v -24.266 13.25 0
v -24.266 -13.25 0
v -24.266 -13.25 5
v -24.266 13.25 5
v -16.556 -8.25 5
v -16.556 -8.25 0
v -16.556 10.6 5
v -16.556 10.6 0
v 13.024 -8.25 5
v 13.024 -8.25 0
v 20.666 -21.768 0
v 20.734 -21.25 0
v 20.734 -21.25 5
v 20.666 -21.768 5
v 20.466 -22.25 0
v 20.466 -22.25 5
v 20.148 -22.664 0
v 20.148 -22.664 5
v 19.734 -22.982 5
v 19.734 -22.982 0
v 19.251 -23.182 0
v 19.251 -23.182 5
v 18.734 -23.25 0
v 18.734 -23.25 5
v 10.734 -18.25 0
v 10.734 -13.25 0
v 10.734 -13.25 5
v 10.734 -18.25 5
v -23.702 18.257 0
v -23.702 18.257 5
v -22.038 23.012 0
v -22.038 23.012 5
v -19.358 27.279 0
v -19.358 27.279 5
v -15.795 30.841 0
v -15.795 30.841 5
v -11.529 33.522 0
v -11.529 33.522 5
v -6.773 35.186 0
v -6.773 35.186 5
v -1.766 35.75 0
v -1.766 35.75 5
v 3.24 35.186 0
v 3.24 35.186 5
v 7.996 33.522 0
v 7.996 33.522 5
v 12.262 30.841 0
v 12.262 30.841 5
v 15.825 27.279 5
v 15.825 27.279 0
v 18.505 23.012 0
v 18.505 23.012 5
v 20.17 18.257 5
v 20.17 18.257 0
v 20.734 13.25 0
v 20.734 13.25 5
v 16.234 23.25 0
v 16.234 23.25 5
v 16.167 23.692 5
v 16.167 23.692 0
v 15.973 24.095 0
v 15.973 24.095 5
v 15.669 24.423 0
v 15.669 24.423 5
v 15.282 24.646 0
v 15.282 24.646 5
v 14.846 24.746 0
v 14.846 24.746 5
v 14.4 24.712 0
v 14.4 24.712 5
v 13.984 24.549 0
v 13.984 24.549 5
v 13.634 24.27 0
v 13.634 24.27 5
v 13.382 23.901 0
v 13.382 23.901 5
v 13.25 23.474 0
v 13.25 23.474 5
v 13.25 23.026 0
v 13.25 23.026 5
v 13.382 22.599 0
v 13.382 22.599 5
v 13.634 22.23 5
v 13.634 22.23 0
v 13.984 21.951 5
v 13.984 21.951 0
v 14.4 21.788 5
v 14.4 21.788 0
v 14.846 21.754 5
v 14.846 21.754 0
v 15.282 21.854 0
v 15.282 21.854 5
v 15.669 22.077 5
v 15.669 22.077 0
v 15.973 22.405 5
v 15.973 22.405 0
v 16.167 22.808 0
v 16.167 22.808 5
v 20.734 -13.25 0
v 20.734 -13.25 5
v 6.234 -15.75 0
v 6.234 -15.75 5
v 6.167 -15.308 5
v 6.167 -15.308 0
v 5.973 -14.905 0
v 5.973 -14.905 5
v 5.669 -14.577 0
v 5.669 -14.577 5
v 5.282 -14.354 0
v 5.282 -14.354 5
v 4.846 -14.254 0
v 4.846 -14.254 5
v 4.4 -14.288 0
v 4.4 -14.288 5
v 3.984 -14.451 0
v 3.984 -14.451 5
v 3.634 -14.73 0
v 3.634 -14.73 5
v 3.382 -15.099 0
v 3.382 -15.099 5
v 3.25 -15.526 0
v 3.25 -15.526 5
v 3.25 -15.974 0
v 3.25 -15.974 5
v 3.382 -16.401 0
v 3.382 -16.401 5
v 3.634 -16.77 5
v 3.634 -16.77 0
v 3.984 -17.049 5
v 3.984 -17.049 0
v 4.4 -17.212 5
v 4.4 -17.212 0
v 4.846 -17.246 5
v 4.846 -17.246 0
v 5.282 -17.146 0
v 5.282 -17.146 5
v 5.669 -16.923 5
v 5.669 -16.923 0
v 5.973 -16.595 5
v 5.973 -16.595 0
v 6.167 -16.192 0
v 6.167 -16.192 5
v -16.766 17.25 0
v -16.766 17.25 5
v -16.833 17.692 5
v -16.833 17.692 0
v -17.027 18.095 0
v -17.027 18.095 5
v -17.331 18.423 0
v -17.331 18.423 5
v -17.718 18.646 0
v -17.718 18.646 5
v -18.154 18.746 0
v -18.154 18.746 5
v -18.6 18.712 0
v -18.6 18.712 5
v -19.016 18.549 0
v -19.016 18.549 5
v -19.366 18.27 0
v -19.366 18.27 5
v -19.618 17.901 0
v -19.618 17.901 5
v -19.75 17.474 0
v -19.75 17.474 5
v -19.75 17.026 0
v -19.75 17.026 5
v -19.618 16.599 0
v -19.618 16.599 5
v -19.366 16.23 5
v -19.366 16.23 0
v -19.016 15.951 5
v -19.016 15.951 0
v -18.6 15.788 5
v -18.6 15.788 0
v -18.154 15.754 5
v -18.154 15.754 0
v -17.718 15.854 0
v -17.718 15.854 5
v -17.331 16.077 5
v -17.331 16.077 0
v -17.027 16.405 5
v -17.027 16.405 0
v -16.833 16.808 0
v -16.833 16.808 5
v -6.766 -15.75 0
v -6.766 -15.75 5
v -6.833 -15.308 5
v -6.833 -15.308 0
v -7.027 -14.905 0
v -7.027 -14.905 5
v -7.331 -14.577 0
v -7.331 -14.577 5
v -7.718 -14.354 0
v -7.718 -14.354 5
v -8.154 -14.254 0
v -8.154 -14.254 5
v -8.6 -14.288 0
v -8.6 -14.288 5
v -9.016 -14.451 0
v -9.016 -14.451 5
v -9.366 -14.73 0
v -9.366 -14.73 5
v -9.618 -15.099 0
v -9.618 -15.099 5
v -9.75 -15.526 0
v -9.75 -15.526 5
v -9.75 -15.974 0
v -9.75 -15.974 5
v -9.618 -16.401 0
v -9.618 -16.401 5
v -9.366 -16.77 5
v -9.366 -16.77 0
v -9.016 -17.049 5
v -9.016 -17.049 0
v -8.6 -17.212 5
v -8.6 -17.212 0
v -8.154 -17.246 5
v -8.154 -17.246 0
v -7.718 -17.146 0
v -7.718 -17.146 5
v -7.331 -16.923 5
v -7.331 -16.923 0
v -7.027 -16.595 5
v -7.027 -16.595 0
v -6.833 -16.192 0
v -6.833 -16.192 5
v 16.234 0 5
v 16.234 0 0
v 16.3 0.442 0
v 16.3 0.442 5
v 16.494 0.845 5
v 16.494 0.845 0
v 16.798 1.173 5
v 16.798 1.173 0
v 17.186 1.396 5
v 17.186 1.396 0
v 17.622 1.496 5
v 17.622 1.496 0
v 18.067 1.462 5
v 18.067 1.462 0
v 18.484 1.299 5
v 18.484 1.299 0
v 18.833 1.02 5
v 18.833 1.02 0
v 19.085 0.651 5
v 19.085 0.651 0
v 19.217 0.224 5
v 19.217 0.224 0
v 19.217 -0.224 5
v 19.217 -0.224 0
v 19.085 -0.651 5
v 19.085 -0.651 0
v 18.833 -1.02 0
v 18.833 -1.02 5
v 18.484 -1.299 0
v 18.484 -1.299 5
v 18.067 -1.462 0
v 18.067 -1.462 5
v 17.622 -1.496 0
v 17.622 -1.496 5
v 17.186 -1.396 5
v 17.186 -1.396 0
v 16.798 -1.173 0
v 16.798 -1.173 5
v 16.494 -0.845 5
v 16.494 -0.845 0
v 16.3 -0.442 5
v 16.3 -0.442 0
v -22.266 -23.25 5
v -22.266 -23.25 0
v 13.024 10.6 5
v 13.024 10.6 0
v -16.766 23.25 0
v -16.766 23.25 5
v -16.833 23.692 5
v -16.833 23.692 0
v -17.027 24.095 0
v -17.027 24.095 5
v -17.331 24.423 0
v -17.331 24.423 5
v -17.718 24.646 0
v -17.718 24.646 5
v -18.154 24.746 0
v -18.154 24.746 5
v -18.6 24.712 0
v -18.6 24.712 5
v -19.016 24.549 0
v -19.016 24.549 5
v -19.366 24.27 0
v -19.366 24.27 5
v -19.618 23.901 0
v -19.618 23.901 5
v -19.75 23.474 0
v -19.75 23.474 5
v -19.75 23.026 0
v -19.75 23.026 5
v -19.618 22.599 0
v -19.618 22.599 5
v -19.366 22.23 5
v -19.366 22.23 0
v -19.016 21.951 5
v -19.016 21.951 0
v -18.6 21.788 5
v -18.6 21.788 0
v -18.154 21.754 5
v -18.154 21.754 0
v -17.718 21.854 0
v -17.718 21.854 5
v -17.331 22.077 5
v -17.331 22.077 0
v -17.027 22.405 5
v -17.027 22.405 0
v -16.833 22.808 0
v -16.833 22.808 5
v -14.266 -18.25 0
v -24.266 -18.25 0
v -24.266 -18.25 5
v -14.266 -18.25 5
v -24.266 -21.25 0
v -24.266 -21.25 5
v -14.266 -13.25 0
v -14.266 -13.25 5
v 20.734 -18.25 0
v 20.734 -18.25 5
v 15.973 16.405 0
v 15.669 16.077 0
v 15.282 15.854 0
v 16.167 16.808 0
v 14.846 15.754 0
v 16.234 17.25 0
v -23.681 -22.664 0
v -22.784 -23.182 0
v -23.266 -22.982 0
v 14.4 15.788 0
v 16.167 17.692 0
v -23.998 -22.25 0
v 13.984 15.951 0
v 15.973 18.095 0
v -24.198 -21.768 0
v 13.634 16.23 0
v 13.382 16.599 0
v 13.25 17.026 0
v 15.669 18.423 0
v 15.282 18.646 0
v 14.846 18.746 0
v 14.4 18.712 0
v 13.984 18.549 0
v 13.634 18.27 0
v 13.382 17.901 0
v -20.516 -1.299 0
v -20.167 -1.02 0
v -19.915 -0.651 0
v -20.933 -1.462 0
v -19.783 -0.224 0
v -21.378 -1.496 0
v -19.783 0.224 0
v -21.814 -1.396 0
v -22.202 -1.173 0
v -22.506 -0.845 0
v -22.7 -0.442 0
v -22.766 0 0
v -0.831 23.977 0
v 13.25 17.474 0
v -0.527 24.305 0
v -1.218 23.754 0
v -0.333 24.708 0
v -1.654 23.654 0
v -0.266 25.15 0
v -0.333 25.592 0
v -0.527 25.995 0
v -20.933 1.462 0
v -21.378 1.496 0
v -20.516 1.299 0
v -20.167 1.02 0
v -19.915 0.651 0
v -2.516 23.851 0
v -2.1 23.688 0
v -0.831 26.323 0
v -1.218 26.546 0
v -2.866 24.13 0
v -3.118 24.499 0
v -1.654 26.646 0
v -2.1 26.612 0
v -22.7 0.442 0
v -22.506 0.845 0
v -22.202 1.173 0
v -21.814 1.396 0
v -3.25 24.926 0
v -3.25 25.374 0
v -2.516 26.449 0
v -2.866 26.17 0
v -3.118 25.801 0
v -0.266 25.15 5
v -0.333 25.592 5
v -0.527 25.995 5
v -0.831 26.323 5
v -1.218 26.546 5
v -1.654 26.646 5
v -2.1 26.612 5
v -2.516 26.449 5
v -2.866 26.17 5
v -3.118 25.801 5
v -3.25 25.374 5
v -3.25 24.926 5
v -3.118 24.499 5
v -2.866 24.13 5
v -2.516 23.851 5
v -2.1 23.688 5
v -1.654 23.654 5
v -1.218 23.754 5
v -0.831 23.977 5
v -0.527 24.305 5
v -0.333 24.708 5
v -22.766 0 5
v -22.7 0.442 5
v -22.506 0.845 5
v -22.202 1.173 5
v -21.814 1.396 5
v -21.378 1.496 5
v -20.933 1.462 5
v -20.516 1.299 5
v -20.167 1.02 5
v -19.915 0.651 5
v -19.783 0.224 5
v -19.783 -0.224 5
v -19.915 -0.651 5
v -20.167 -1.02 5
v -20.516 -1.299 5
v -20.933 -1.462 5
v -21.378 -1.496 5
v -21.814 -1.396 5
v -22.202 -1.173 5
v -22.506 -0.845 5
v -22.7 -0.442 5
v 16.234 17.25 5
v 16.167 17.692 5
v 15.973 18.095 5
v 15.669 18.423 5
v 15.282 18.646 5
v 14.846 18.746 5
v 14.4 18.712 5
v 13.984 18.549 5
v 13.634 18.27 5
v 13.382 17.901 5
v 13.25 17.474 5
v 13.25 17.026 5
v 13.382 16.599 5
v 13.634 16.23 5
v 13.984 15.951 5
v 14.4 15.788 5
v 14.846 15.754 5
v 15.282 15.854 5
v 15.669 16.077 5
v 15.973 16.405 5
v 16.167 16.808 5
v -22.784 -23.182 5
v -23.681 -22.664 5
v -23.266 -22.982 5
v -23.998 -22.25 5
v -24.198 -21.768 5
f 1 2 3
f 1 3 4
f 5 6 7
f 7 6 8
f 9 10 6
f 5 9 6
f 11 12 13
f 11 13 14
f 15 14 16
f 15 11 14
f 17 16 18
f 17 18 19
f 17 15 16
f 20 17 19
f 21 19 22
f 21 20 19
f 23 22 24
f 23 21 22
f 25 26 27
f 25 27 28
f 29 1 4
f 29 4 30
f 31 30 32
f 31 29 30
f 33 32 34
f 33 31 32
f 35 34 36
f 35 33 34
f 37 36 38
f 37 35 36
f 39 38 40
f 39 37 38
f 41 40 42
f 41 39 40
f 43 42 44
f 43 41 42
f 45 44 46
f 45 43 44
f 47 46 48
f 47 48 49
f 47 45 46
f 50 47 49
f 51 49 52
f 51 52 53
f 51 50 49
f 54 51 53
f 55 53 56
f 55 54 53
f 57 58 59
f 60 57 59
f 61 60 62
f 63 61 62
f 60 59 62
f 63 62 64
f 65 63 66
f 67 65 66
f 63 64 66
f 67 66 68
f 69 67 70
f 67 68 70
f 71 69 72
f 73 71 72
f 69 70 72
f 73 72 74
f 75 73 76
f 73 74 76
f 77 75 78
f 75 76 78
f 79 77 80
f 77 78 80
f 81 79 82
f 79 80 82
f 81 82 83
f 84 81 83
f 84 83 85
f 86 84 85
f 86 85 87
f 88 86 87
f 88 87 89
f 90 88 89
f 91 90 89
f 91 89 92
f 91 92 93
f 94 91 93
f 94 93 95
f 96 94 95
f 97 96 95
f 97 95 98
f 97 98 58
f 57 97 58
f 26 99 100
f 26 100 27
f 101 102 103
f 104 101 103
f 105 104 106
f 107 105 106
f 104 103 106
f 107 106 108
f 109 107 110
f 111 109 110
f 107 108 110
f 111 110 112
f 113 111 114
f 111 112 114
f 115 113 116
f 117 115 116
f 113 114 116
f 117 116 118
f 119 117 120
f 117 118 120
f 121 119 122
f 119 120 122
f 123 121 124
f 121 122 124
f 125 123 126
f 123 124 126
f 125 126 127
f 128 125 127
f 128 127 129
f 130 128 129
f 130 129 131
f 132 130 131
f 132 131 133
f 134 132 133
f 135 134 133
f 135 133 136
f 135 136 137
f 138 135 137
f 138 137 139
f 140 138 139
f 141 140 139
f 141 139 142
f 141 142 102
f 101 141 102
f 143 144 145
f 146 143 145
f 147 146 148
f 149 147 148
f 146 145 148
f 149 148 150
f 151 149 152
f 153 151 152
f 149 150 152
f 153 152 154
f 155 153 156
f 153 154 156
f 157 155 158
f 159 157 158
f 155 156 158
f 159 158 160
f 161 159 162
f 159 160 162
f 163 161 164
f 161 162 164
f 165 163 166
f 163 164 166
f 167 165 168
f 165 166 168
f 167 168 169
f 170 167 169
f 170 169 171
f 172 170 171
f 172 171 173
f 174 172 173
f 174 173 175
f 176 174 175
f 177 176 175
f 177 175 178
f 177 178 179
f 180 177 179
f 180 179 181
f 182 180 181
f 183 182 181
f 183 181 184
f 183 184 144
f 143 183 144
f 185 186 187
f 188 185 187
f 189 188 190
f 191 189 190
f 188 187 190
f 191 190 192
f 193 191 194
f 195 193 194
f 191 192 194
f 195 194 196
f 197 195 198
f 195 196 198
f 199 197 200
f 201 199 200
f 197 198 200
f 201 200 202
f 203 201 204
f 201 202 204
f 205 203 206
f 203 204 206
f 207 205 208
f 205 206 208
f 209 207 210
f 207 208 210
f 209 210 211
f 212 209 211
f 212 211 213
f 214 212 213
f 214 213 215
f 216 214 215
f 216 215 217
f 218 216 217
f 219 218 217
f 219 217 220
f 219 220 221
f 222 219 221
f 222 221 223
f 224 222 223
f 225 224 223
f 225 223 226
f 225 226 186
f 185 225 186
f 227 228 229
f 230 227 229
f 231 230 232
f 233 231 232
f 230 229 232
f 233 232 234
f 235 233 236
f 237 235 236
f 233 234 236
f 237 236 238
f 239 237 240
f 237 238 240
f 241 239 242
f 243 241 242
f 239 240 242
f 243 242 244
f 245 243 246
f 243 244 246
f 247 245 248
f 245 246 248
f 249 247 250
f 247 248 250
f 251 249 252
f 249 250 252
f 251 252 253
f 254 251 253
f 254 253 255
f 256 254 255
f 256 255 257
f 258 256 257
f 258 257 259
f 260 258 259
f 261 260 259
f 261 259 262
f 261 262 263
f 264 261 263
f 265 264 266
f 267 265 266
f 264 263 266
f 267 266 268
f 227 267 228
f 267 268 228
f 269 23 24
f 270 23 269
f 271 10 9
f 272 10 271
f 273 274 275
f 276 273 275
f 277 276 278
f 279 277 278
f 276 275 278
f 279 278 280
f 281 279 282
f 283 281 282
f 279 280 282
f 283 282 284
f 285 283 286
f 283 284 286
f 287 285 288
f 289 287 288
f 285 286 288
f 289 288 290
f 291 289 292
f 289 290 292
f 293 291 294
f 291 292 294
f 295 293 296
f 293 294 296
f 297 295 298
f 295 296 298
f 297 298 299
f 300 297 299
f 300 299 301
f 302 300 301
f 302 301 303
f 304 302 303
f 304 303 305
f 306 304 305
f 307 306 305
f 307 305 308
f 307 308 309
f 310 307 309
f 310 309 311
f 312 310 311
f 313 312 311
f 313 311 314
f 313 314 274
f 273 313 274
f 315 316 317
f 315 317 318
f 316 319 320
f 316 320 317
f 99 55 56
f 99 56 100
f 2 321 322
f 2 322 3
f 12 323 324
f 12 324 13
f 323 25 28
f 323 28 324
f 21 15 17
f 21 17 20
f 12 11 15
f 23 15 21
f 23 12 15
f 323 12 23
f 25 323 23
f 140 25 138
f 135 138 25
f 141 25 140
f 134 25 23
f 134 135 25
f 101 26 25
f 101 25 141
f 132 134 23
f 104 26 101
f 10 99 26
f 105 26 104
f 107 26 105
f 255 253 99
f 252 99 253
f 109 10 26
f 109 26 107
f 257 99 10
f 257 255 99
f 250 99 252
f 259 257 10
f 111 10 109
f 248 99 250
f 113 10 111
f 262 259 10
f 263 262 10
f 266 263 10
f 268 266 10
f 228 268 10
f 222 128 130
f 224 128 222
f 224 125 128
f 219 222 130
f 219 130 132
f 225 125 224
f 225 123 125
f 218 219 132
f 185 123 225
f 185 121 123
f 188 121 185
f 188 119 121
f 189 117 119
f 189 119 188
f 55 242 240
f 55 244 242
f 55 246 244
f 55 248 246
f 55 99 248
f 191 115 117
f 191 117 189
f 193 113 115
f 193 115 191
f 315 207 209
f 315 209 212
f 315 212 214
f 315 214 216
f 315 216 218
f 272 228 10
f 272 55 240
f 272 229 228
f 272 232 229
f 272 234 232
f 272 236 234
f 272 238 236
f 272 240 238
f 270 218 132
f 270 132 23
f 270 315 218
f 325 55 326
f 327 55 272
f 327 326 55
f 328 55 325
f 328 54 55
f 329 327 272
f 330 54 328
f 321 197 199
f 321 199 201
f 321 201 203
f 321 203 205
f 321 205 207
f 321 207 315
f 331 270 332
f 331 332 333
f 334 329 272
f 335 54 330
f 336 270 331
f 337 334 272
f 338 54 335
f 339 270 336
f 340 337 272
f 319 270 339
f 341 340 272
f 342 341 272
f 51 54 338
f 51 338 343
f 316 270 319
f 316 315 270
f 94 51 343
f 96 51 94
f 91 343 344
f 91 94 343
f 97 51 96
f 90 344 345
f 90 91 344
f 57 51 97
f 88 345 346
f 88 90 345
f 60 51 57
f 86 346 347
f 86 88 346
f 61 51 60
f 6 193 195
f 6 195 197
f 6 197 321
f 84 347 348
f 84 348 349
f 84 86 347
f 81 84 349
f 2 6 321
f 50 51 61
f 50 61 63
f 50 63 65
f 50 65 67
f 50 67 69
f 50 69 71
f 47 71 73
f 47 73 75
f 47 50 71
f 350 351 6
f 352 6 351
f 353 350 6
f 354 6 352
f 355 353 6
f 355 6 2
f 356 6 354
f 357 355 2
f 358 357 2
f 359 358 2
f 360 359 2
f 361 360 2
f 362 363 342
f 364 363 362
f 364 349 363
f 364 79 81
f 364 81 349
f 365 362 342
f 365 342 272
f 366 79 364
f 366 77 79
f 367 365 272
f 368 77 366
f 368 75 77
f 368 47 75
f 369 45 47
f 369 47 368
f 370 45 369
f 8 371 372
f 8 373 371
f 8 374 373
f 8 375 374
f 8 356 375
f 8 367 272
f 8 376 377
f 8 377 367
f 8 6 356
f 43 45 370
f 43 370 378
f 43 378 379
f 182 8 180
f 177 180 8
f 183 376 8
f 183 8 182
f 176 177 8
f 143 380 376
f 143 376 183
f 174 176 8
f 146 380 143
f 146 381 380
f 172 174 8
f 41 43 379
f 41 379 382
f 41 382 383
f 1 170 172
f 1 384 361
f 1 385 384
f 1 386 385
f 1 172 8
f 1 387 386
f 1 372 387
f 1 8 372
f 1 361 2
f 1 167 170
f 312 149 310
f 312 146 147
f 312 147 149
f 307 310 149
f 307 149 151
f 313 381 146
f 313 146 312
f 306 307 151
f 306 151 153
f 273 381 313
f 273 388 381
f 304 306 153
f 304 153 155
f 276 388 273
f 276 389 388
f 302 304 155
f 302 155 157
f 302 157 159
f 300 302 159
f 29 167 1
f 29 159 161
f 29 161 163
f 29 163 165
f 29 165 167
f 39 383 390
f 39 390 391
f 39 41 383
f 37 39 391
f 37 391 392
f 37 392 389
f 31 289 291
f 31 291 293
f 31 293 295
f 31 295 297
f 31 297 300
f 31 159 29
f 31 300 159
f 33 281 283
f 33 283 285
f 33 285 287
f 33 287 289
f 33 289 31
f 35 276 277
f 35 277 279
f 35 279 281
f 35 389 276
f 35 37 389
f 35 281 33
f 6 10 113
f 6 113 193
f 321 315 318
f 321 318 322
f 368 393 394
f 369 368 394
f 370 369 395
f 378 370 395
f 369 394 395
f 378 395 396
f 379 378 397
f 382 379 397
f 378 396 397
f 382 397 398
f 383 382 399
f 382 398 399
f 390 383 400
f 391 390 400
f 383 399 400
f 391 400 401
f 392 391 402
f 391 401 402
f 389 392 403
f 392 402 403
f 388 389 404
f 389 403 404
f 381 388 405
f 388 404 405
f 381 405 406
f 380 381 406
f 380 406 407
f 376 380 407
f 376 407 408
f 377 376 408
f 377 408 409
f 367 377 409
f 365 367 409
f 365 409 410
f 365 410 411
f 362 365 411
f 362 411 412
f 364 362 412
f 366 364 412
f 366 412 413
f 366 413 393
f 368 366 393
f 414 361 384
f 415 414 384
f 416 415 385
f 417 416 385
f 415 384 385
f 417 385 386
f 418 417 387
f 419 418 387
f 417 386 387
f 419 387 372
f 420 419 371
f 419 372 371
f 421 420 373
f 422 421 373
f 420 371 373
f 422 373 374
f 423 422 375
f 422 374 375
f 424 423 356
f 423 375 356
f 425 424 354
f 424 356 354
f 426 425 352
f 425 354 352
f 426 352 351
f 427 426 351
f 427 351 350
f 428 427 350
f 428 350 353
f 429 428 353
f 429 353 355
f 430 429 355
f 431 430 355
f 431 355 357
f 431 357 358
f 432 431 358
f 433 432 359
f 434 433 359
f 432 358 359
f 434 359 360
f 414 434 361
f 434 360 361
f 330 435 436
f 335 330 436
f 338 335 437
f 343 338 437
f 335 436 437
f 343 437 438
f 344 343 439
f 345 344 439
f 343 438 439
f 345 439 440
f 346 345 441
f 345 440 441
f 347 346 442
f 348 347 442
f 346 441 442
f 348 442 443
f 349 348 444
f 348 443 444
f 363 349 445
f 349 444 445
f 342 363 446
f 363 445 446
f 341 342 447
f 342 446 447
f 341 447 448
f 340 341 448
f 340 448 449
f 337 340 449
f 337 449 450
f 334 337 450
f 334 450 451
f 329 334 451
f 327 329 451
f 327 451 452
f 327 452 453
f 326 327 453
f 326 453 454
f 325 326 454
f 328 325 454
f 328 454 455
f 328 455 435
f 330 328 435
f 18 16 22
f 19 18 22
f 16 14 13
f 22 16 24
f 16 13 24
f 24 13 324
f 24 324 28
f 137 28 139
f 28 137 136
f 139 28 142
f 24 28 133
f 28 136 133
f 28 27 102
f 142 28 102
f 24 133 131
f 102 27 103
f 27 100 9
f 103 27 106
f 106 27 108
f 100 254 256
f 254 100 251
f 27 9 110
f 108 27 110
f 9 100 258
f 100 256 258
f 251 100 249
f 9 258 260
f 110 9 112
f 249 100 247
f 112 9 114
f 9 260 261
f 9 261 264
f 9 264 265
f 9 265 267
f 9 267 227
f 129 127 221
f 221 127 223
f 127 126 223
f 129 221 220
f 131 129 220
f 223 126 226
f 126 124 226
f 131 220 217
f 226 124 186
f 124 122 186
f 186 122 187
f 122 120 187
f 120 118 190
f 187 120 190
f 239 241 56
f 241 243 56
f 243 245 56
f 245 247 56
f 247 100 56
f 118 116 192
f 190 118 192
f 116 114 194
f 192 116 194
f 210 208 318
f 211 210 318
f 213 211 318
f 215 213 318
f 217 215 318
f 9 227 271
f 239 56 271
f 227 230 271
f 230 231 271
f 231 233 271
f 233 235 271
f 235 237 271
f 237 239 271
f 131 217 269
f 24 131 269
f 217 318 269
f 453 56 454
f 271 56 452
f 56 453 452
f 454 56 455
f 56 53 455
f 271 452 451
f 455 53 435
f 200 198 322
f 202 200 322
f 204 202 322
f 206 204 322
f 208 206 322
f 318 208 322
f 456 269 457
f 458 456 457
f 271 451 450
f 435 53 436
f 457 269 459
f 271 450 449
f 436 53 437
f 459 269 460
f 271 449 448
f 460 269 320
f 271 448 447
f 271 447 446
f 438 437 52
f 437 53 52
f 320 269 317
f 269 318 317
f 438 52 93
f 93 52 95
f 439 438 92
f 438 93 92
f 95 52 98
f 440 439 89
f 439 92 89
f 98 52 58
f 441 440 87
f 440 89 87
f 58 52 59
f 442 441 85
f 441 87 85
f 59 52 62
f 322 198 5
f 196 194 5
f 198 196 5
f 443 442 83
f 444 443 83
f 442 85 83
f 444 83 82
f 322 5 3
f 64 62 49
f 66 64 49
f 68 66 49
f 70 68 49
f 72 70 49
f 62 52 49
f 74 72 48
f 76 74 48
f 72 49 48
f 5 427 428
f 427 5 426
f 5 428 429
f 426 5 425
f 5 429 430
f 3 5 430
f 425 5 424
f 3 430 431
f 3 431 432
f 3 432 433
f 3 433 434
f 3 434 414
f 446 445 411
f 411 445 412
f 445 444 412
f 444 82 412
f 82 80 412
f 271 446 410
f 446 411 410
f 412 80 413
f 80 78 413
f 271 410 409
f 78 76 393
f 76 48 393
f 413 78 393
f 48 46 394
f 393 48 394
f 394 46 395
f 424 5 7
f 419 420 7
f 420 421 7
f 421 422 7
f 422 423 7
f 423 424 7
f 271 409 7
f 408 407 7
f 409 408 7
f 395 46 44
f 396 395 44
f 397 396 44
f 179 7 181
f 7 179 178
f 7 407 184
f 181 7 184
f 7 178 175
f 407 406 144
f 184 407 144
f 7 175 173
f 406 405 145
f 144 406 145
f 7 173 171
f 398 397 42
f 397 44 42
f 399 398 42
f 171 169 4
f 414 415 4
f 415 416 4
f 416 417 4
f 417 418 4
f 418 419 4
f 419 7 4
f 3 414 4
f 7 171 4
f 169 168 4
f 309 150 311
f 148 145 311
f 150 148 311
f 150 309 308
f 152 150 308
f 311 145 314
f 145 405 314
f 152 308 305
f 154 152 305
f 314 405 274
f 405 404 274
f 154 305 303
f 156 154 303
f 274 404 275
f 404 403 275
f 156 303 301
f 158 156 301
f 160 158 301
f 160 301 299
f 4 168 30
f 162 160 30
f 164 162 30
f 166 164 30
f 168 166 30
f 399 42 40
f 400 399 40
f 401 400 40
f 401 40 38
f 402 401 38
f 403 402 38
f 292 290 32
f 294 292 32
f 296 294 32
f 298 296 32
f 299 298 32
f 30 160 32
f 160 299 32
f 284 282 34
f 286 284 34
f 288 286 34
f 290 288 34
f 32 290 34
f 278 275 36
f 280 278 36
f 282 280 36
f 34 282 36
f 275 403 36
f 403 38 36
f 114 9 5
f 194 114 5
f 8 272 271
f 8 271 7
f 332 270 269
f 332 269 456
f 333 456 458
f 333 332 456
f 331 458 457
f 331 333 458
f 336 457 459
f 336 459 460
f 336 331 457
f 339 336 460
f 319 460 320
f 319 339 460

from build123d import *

# Parameters (mm, degrees)
RESSALTO_EXTRUS_O2_DEPTH = 5
ESBO_O9_W                = 29.58
ESBO_O9_H                = 18.85
CORTE_EXTRUS_O1_DEPTH    = 5
ESBO_O10_R               = 1.5
CORTE_EXTRUS_O2_DEPTH    = 5
ESBO_O12_R               = 1.5
CORTE_EXTRUS_O3_DEPTH    = 10
ESBO_O13_R               = 1.5
CORTE_EXTRUS_O4_DEPTH    = 10
ESBO_O14_R               = 1.5
CORTE_EXTRUS_O5_DEPTH    = 76


with BuildPart() as part:
    # Esboço8 → Ressalto-extrusão2 (new body)
    with BuildSketch(Plane.XY):
        with BuildLine():
            Line((-24.266341706, -3.25), (-24.266341706, 13.25))
            ThreePointArc((-24.266341706, 13.25), (-1.766341706, 35.75), (20.733658294, 13.25))
            Line((20.733658294, 13.25), (20.733658294, -3.222268622))
            Line((20.733658294, -3.222268622), (20.733658294, -3.25))
            Line((20.733658294, -3.25), (20.733658294, -13.25))
            Line((20.733658294, -13.25), (10.733658294, -13.25))
            Line((10.733658294, -13.25), (10.733658294, -18.25))
            Line((10.733658294, -18.25), (20.733658294, -18.25))
            Line((20.733658294, -18.25), (20.733658294, -21.25))
            ThreePointArc((20.733658294, -21.25), (20.147871857, -22.664213562), (18.733658294, -23.25))
            Line((18.733658294, -23.25), (-22.266341706, -23.25))
            ThreePointArc((-22.266341706, -23.25), (-23.680555268, -22.664213562), (-24.266341706, -21.25))
            Line((-24.266341706, -21.25), (-24.266341706, -18.25))
            Line((-24.266341706, -18.25), (-14.266341706, -18.25))
            Line((-14.266341706, -18.25), (-14.266341706, -13.25))
            Line((-14.266341706, -13.25), (-24.266341706, -13.25))
            Line((-24.266341706, -13.25), (-24.266341706, -3.25))
        make_face()
    extrude(amount=RESSALTO_EXTRUS_O2_DEPTH)

    # Esboço9 → Corte-extrusão1 (cut)
    with BuildSketch(Plane(origin=(0, 0, 0), x_dir=(-1, 0, 0), z_dir=(0, 0, -1))):
        with Locations((1.766341706, 1.175)):
            Rectangle(ESBO_O9_W, ESBO_O9_H)
    extrude(amount=-CORTE_EXTRUS_O1_DEPTH, mode=Mode.SUBTRACT)

    # Esboço10 → Corte-extrusão2 (cut)
    with BuildSketch(Plane(origin=(0, 0, 0), x_dir=(-1, 0, 0), z_dir=(0, 0, -1))):
        with Locations((-17.733658294, 0)):
            Circle(ESBO_O10_R)
        with Locations((21.266341706, 0)):
            Circle(ESBO_O10_R)
    extrude(amount=-CORTE_EXTRUS_O2_DEPTH, mode=Mode.SUBTRACT)

    # Esboço12 → Corte-extrusão3 (cut)
    with BuildSketch(Plane.XY.offset(5)):
        with Locations((4.733658294, -15.75)):
            Circle(ESBO_O12_R)
        with Locations((-8.266341706, -15.75)):
            Circle(ESBO_O12_R)
    extrude(amount=-CORTE_EXTRUS_O3_DEPTH, mode=Mode.SUBTRACT)

    # Esboço13 → Corte-extrusão4 (cut)
    with BuildSketch(Plane.XY.offset(5)):
        with Locations((-1.766341706, 25.15)):
            Circle(ESBO_O13_R)
    extrude(amount=-CORTE_EXTRUS_O4_DEPTH, mode=Mode.SUBTRACT)

    # Esboço14 → Corte-extrusão5 (cut)
    with BuildSketch(Plane.XY.offset(5)):
        with Locations((14.733658294, 17.25)):
            Circle(ESBO_O14_R)
        with Locations((14.733658294, 23.25)):
            Circle(ESBO_O14_R)
        with Locations((-18.266341706, 23.25)):
            Circle(ESBO_O14_R)
        with Locations((-18.266341706, 17.25)):
            Circle(ESBO_O14_R)
    extrude(amount=-CORTE_EXTRUS_O5_DEPTH, mode=Mode.SUBTRACT)


solid = part.part
